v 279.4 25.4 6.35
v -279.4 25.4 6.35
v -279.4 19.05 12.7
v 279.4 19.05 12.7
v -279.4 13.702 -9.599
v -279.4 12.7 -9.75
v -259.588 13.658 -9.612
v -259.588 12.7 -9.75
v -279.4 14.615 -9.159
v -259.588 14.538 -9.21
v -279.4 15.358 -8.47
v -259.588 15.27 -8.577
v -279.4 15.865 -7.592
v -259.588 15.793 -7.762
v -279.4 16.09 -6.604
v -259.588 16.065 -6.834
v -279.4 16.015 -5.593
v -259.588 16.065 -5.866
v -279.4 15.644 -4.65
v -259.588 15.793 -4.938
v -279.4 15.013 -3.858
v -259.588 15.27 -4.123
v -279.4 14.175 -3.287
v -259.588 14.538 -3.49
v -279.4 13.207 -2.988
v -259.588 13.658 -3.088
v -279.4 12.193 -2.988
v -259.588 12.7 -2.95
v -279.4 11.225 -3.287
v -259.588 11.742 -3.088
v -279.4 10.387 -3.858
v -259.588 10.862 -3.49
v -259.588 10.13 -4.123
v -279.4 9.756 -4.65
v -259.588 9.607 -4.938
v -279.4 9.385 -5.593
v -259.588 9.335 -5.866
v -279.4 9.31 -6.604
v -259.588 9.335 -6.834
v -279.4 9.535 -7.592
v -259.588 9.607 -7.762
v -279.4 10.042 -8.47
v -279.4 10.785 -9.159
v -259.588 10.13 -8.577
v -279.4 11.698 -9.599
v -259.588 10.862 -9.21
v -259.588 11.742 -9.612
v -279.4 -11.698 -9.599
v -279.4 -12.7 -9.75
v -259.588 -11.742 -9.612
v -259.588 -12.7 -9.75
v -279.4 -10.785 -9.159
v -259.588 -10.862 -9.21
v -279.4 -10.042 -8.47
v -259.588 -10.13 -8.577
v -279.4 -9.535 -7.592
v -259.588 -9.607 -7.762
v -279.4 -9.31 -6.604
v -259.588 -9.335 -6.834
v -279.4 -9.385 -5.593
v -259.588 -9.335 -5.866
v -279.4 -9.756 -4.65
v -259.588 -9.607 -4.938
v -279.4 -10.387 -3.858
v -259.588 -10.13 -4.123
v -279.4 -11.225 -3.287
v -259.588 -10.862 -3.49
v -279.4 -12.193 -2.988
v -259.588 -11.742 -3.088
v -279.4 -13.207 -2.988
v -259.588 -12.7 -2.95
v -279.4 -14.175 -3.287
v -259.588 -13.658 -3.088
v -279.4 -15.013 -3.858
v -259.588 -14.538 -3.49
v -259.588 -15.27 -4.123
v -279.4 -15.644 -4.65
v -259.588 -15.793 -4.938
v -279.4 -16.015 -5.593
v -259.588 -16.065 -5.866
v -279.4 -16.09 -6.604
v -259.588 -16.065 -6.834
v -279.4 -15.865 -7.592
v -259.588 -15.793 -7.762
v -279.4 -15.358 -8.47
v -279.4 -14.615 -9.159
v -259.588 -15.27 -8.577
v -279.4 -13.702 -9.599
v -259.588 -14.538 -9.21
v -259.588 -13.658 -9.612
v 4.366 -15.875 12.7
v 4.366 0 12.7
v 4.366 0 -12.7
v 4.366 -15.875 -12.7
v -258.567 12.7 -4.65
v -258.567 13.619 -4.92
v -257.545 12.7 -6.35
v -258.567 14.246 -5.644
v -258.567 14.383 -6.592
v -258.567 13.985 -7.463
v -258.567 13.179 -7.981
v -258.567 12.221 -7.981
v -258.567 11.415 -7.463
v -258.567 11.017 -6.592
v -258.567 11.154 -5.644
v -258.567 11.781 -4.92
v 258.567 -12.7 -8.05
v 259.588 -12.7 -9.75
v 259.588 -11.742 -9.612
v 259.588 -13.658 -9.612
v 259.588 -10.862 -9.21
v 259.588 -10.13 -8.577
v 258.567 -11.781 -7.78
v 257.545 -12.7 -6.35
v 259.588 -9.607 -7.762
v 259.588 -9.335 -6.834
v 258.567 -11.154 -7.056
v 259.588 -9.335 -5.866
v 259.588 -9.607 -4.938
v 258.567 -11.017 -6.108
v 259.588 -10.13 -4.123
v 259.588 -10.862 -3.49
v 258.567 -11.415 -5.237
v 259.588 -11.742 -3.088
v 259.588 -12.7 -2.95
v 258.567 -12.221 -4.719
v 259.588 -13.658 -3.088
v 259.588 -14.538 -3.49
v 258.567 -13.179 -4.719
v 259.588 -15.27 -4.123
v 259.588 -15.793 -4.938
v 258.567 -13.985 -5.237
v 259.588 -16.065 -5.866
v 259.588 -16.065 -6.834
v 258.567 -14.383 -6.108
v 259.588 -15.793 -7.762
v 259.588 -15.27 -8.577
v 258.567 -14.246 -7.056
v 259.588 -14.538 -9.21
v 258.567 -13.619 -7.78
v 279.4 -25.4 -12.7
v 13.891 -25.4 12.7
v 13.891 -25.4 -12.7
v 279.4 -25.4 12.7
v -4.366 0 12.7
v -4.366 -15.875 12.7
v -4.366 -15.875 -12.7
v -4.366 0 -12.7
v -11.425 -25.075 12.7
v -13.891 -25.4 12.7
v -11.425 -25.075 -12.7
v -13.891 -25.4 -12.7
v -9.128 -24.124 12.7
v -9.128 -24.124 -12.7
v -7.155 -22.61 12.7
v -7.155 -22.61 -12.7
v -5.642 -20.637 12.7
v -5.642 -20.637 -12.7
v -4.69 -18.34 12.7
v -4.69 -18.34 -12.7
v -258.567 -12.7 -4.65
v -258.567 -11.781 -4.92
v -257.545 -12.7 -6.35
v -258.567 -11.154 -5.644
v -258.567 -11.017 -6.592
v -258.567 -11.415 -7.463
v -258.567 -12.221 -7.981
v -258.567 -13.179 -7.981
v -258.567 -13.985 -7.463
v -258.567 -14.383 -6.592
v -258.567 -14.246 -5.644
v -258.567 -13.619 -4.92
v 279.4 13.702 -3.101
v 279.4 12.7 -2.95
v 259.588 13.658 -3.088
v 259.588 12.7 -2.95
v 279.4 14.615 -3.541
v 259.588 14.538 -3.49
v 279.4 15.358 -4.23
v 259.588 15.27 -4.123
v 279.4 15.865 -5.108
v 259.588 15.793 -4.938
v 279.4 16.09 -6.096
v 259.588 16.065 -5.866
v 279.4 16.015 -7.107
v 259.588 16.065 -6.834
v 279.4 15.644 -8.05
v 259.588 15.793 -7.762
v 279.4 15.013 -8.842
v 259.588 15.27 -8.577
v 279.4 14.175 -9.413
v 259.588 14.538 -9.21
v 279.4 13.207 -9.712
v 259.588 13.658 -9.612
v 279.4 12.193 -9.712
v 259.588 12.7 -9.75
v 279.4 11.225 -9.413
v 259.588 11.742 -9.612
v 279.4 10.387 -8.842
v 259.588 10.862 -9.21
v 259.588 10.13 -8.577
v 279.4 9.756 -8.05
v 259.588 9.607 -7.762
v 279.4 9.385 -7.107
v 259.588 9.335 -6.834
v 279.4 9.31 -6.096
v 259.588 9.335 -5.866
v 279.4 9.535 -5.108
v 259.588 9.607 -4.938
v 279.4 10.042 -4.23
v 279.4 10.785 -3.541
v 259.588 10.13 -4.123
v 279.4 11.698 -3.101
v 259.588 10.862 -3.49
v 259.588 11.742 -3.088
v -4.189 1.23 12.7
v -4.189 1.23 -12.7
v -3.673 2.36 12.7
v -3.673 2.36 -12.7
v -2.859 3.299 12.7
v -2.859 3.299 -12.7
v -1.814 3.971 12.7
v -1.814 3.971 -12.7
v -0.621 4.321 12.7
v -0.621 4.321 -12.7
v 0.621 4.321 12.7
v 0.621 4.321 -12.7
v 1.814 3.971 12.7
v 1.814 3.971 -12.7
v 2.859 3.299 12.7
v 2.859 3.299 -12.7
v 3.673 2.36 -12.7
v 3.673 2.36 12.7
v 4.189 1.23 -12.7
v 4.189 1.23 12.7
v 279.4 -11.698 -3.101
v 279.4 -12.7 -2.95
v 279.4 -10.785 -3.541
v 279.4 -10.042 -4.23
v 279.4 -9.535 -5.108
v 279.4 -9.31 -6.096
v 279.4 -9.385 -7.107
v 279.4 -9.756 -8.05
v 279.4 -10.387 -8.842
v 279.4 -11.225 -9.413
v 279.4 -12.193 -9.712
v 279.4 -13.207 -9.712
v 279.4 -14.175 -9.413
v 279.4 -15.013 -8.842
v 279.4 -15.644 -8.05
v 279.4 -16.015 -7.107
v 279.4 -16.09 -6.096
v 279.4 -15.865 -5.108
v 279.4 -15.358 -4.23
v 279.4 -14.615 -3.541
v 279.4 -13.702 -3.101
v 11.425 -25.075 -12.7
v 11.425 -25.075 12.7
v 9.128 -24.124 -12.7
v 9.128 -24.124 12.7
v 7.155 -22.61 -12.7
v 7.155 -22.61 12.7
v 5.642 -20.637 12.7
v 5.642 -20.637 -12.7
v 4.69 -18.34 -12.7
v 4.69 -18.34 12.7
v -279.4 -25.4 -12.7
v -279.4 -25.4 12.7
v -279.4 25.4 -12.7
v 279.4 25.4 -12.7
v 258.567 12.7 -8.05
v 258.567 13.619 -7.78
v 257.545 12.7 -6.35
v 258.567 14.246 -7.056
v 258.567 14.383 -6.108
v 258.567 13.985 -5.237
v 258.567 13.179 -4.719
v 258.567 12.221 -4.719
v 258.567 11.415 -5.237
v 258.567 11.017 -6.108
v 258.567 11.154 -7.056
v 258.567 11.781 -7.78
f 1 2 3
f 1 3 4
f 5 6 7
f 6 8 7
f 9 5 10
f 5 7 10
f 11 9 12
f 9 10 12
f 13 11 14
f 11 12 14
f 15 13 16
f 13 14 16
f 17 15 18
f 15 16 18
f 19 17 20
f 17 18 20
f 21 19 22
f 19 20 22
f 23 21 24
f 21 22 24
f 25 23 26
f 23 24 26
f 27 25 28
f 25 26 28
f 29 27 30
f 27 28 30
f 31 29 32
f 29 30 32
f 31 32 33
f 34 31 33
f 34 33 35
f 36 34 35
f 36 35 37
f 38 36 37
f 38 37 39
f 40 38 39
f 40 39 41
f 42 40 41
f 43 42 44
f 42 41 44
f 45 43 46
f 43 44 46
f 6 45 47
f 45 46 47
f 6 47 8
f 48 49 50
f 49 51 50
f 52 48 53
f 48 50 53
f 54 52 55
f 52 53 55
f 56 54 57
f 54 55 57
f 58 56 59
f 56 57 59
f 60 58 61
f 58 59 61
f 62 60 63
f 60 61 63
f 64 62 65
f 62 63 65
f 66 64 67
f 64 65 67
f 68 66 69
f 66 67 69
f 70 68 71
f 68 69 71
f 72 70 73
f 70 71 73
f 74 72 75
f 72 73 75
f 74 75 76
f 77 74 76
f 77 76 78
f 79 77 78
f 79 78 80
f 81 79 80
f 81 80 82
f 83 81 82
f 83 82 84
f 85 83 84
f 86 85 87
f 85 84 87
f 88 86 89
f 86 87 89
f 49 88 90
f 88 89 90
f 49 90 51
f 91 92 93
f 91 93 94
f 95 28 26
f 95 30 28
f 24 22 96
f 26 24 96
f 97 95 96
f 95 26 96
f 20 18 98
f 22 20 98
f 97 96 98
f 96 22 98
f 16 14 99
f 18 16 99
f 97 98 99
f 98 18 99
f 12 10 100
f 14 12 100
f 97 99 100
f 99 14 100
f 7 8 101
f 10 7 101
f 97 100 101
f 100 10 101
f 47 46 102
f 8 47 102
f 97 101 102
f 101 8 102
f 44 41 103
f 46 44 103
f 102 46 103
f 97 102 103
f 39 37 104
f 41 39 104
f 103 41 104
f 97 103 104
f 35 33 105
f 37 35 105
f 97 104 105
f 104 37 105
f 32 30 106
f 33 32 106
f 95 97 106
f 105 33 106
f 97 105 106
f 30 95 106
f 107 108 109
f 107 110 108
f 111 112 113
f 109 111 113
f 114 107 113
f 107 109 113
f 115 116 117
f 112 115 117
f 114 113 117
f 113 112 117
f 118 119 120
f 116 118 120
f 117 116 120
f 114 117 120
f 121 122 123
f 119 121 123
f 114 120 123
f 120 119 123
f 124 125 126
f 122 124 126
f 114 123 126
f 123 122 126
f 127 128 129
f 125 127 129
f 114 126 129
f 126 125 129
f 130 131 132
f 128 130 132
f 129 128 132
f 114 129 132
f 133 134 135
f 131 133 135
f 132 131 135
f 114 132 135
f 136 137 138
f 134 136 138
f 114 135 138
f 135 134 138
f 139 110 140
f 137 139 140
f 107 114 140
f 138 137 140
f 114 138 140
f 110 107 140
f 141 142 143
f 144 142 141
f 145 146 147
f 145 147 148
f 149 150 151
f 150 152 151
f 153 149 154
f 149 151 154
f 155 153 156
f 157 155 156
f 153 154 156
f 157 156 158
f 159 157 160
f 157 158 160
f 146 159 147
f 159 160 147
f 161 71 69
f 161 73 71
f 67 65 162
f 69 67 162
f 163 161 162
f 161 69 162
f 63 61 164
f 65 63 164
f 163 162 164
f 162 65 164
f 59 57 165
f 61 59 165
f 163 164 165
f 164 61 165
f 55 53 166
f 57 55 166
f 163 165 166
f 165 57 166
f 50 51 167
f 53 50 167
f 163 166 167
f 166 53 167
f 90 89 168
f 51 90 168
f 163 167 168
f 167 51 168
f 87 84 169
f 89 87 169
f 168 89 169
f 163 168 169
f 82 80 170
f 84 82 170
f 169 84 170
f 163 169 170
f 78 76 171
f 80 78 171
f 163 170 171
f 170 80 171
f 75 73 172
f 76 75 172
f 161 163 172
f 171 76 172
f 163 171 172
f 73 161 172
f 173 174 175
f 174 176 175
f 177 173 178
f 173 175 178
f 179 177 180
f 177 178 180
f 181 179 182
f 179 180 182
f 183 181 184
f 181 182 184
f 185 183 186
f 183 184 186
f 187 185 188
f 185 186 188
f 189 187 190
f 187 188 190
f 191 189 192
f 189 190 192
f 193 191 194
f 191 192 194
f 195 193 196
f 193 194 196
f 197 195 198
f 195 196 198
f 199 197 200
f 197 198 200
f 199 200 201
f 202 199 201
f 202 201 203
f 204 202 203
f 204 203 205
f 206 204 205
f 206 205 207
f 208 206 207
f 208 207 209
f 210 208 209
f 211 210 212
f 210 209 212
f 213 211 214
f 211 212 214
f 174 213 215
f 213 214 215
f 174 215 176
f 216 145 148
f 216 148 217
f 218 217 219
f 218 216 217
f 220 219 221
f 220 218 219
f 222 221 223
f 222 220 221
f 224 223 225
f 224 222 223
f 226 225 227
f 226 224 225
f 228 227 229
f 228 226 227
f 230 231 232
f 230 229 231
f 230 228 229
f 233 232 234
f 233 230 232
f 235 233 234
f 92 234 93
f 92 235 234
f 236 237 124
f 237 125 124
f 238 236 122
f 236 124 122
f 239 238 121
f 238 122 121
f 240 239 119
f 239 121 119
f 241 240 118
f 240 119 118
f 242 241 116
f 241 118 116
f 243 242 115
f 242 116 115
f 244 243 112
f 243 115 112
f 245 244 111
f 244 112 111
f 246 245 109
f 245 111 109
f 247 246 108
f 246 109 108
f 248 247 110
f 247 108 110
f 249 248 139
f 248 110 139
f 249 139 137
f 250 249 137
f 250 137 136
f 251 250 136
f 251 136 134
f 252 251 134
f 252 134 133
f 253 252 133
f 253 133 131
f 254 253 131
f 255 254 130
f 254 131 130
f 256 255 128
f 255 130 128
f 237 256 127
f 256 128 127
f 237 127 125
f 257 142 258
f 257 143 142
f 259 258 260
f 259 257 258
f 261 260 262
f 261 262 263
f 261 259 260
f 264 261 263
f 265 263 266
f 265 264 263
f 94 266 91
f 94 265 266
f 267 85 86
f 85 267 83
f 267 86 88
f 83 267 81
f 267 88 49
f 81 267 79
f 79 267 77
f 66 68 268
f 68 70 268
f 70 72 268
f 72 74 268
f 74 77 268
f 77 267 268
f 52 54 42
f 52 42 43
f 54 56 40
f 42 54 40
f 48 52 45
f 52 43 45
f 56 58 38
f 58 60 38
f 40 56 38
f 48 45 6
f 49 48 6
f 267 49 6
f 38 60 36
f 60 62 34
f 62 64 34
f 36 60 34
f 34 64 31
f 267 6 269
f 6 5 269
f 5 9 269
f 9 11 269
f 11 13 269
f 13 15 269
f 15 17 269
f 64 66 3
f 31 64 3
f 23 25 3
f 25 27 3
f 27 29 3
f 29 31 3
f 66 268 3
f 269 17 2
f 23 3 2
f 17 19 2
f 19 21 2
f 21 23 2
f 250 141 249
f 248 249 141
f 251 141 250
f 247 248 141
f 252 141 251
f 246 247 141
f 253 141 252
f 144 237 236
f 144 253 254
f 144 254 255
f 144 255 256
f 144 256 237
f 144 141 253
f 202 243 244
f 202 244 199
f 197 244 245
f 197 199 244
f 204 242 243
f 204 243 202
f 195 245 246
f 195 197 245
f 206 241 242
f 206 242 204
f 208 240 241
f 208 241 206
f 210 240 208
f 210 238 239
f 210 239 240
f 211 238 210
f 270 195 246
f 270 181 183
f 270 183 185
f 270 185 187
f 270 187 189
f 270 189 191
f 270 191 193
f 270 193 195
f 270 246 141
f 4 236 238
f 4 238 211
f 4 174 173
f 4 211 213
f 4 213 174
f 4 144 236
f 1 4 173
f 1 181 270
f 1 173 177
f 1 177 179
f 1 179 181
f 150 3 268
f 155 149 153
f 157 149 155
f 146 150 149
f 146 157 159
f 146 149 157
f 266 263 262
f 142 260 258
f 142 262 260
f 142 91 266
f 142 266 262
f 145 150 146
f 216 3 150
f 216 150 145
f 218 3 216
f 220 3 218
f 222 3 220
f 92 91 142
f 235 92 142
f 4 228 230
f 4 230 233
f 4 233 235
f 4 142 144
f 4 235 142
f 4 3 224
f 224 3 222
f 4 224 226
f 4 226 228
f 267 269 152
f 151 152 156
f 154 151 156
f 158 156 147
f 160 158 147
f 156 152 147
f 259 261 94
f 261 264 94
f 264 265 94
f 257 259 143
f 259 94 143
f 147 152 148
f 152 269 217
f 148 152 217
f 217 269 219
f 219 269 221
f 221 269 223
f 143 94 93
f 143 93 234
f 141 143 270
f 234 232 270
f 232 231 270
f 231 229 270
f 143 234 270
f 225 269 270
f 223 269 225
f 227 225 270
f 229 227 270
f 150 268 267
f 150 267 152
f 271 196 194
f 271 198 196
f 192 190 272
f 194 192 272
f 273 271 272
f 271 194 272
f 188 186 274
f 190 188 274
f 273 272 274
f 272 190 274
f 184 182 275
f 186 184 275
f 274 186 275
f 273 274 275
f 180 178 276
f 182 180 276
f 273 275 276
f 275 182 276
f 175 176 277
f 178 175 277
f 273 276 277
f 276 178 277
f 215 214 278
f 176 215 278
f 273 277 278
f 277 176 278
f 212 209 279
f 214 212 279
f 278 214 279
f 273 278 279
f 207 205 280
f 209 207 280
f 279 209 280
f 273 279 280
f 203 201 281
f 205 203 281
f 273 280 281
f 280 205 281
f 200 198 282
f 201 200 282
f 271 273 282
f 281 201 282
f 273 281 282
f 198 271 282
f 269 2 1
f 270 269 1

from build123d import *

# Parameters (mm, degrees)
SKETCH1_W                  = 558.8
SKETCH1_H                  = 50.8
EXTRUDE1_DEPTH             = 12.7
CUT_EXTRUDE3_REACH         = 27.4
FILLET2_R                  = 9.525
M8X1_25_TAPPED_HOLE1_D     = 6.8
M8X1_25_TAPPED_HOLE1_DEPTH = 19.812
M8X1_25_TAPPED_HOLE1_TIP   = 2.042926105
M8X1_25_TAPPED_HOLE2_D     = 6.8
M8X1_25_TAPPED_HOLE2_DEPTH = 19.812
M8X1_25_TAPPED_HOLE2_TIP   = 2.042926105
CHAMFER1_SIZE              = 6.35


with BuildPart() as part:
    # Sketch1 → Extrude1 (new body, symmetric)
    with BuildSketch(Plane.XY):
        Rectangle(SKETCH1_W, SKETCH1_H)
    extrude(amount=EXTRUDE1_DEPTH, both=True)

    # Sketch4 → Cut-Extrude3 (cut, up to next)
    with BuildSketch(Plane.XY.offset(12.7), mode=Mode.PRIVATE) as cut_extrude3_sk1:
        with BuildLine():
            Line((-4.365625, -25.4), (-4.365625, 0))
            ThreePointArc((-4.365625, 0), (0, 4.365625), (4.365625, 0))
            Line((4.365625, 0), (4.365625, -25.4))
            ThreePointArc((4.365625, -25.4), (0, -29.765625), (-4.365625, -25.4))
        make_face()
    cut_extrude3_tool1 = extrude(cut_extrude3_sk1.sketch, amount=-CUT_EXTRUDE3_REACH, mode=Mode.PRIVATE) & part.part
    add(cut_extrude3_tool1.solids().sort_by_distance((0, -12.7, 12.7))[0], mode=Mode.SUBTRACT)

    # Fillet2
    fillet2_edges = [part.edges().sort_by_distance(p)[0] for p in [
        (-4.365625, -25.4, 0),
        (4.365625, -25.4, 0),
    ]]
    fillet(fillet2_edges, radius=FILLET2_R)

    # M8x1.25 Tapped Hole1
    with Locations(Plane(origin=(279.4, 0, 0), x_dir=(0, 0, -1), z_dir=(1, 0, 0))):
        with Locations((6.35, 12.7), (6.35, -12.7)):
            Hole(M8X1_25_TAPPED_HOLE1_D / 2, depth=M8X1_25_TAPPED_HOLE1_DEPTH)
            with Locations((0, 0, -(M8X1_25_TAPPED_HOLE1_DEPTH + M8X1_25_TAPPED_HOLE1_TIP / 2))):  # 118° drill point
                Cone(0, M8X1_25_TAPPED_HOLE1_D / 2, M8X1_25_TAPPED_HOLE1_TIP, mode=Mode.SUBTRACT)

    # M8x1.25 Tapped Hole2
    with Locations(Plane.ZY.offset(279.4)):
        with Locations((-6.35, 12.7), (-6.35, -12.7)):
            Hole(M8X1_25_TAPPED_HOLE2_D / 2, depth=M8X1_25_TAPPED_HOLE2_DEPTH)
            with Locations((0, 0, -(M8X1_25_TAPPED_HOLE2_DEPTH + M8X1_25_TAPPED_HOLE2_TIP / 2))):  # 118° drill point
                Cone(0, M8X1_25_TAPPED_HOLE2_D / 2, M8X1_25_TAPPED_HOLE2_TIP, mode=Mode.SUBTRACT)

    # Chamfer1
    chamfer1_edges = [part.edges().sort_by_distance(p)[0] for p in [
        (0, 25.4, 12.7),
    ]]
    chamfer(chamfer1_edges, length=CHAMFER1_SIZE)


solid = part.part
